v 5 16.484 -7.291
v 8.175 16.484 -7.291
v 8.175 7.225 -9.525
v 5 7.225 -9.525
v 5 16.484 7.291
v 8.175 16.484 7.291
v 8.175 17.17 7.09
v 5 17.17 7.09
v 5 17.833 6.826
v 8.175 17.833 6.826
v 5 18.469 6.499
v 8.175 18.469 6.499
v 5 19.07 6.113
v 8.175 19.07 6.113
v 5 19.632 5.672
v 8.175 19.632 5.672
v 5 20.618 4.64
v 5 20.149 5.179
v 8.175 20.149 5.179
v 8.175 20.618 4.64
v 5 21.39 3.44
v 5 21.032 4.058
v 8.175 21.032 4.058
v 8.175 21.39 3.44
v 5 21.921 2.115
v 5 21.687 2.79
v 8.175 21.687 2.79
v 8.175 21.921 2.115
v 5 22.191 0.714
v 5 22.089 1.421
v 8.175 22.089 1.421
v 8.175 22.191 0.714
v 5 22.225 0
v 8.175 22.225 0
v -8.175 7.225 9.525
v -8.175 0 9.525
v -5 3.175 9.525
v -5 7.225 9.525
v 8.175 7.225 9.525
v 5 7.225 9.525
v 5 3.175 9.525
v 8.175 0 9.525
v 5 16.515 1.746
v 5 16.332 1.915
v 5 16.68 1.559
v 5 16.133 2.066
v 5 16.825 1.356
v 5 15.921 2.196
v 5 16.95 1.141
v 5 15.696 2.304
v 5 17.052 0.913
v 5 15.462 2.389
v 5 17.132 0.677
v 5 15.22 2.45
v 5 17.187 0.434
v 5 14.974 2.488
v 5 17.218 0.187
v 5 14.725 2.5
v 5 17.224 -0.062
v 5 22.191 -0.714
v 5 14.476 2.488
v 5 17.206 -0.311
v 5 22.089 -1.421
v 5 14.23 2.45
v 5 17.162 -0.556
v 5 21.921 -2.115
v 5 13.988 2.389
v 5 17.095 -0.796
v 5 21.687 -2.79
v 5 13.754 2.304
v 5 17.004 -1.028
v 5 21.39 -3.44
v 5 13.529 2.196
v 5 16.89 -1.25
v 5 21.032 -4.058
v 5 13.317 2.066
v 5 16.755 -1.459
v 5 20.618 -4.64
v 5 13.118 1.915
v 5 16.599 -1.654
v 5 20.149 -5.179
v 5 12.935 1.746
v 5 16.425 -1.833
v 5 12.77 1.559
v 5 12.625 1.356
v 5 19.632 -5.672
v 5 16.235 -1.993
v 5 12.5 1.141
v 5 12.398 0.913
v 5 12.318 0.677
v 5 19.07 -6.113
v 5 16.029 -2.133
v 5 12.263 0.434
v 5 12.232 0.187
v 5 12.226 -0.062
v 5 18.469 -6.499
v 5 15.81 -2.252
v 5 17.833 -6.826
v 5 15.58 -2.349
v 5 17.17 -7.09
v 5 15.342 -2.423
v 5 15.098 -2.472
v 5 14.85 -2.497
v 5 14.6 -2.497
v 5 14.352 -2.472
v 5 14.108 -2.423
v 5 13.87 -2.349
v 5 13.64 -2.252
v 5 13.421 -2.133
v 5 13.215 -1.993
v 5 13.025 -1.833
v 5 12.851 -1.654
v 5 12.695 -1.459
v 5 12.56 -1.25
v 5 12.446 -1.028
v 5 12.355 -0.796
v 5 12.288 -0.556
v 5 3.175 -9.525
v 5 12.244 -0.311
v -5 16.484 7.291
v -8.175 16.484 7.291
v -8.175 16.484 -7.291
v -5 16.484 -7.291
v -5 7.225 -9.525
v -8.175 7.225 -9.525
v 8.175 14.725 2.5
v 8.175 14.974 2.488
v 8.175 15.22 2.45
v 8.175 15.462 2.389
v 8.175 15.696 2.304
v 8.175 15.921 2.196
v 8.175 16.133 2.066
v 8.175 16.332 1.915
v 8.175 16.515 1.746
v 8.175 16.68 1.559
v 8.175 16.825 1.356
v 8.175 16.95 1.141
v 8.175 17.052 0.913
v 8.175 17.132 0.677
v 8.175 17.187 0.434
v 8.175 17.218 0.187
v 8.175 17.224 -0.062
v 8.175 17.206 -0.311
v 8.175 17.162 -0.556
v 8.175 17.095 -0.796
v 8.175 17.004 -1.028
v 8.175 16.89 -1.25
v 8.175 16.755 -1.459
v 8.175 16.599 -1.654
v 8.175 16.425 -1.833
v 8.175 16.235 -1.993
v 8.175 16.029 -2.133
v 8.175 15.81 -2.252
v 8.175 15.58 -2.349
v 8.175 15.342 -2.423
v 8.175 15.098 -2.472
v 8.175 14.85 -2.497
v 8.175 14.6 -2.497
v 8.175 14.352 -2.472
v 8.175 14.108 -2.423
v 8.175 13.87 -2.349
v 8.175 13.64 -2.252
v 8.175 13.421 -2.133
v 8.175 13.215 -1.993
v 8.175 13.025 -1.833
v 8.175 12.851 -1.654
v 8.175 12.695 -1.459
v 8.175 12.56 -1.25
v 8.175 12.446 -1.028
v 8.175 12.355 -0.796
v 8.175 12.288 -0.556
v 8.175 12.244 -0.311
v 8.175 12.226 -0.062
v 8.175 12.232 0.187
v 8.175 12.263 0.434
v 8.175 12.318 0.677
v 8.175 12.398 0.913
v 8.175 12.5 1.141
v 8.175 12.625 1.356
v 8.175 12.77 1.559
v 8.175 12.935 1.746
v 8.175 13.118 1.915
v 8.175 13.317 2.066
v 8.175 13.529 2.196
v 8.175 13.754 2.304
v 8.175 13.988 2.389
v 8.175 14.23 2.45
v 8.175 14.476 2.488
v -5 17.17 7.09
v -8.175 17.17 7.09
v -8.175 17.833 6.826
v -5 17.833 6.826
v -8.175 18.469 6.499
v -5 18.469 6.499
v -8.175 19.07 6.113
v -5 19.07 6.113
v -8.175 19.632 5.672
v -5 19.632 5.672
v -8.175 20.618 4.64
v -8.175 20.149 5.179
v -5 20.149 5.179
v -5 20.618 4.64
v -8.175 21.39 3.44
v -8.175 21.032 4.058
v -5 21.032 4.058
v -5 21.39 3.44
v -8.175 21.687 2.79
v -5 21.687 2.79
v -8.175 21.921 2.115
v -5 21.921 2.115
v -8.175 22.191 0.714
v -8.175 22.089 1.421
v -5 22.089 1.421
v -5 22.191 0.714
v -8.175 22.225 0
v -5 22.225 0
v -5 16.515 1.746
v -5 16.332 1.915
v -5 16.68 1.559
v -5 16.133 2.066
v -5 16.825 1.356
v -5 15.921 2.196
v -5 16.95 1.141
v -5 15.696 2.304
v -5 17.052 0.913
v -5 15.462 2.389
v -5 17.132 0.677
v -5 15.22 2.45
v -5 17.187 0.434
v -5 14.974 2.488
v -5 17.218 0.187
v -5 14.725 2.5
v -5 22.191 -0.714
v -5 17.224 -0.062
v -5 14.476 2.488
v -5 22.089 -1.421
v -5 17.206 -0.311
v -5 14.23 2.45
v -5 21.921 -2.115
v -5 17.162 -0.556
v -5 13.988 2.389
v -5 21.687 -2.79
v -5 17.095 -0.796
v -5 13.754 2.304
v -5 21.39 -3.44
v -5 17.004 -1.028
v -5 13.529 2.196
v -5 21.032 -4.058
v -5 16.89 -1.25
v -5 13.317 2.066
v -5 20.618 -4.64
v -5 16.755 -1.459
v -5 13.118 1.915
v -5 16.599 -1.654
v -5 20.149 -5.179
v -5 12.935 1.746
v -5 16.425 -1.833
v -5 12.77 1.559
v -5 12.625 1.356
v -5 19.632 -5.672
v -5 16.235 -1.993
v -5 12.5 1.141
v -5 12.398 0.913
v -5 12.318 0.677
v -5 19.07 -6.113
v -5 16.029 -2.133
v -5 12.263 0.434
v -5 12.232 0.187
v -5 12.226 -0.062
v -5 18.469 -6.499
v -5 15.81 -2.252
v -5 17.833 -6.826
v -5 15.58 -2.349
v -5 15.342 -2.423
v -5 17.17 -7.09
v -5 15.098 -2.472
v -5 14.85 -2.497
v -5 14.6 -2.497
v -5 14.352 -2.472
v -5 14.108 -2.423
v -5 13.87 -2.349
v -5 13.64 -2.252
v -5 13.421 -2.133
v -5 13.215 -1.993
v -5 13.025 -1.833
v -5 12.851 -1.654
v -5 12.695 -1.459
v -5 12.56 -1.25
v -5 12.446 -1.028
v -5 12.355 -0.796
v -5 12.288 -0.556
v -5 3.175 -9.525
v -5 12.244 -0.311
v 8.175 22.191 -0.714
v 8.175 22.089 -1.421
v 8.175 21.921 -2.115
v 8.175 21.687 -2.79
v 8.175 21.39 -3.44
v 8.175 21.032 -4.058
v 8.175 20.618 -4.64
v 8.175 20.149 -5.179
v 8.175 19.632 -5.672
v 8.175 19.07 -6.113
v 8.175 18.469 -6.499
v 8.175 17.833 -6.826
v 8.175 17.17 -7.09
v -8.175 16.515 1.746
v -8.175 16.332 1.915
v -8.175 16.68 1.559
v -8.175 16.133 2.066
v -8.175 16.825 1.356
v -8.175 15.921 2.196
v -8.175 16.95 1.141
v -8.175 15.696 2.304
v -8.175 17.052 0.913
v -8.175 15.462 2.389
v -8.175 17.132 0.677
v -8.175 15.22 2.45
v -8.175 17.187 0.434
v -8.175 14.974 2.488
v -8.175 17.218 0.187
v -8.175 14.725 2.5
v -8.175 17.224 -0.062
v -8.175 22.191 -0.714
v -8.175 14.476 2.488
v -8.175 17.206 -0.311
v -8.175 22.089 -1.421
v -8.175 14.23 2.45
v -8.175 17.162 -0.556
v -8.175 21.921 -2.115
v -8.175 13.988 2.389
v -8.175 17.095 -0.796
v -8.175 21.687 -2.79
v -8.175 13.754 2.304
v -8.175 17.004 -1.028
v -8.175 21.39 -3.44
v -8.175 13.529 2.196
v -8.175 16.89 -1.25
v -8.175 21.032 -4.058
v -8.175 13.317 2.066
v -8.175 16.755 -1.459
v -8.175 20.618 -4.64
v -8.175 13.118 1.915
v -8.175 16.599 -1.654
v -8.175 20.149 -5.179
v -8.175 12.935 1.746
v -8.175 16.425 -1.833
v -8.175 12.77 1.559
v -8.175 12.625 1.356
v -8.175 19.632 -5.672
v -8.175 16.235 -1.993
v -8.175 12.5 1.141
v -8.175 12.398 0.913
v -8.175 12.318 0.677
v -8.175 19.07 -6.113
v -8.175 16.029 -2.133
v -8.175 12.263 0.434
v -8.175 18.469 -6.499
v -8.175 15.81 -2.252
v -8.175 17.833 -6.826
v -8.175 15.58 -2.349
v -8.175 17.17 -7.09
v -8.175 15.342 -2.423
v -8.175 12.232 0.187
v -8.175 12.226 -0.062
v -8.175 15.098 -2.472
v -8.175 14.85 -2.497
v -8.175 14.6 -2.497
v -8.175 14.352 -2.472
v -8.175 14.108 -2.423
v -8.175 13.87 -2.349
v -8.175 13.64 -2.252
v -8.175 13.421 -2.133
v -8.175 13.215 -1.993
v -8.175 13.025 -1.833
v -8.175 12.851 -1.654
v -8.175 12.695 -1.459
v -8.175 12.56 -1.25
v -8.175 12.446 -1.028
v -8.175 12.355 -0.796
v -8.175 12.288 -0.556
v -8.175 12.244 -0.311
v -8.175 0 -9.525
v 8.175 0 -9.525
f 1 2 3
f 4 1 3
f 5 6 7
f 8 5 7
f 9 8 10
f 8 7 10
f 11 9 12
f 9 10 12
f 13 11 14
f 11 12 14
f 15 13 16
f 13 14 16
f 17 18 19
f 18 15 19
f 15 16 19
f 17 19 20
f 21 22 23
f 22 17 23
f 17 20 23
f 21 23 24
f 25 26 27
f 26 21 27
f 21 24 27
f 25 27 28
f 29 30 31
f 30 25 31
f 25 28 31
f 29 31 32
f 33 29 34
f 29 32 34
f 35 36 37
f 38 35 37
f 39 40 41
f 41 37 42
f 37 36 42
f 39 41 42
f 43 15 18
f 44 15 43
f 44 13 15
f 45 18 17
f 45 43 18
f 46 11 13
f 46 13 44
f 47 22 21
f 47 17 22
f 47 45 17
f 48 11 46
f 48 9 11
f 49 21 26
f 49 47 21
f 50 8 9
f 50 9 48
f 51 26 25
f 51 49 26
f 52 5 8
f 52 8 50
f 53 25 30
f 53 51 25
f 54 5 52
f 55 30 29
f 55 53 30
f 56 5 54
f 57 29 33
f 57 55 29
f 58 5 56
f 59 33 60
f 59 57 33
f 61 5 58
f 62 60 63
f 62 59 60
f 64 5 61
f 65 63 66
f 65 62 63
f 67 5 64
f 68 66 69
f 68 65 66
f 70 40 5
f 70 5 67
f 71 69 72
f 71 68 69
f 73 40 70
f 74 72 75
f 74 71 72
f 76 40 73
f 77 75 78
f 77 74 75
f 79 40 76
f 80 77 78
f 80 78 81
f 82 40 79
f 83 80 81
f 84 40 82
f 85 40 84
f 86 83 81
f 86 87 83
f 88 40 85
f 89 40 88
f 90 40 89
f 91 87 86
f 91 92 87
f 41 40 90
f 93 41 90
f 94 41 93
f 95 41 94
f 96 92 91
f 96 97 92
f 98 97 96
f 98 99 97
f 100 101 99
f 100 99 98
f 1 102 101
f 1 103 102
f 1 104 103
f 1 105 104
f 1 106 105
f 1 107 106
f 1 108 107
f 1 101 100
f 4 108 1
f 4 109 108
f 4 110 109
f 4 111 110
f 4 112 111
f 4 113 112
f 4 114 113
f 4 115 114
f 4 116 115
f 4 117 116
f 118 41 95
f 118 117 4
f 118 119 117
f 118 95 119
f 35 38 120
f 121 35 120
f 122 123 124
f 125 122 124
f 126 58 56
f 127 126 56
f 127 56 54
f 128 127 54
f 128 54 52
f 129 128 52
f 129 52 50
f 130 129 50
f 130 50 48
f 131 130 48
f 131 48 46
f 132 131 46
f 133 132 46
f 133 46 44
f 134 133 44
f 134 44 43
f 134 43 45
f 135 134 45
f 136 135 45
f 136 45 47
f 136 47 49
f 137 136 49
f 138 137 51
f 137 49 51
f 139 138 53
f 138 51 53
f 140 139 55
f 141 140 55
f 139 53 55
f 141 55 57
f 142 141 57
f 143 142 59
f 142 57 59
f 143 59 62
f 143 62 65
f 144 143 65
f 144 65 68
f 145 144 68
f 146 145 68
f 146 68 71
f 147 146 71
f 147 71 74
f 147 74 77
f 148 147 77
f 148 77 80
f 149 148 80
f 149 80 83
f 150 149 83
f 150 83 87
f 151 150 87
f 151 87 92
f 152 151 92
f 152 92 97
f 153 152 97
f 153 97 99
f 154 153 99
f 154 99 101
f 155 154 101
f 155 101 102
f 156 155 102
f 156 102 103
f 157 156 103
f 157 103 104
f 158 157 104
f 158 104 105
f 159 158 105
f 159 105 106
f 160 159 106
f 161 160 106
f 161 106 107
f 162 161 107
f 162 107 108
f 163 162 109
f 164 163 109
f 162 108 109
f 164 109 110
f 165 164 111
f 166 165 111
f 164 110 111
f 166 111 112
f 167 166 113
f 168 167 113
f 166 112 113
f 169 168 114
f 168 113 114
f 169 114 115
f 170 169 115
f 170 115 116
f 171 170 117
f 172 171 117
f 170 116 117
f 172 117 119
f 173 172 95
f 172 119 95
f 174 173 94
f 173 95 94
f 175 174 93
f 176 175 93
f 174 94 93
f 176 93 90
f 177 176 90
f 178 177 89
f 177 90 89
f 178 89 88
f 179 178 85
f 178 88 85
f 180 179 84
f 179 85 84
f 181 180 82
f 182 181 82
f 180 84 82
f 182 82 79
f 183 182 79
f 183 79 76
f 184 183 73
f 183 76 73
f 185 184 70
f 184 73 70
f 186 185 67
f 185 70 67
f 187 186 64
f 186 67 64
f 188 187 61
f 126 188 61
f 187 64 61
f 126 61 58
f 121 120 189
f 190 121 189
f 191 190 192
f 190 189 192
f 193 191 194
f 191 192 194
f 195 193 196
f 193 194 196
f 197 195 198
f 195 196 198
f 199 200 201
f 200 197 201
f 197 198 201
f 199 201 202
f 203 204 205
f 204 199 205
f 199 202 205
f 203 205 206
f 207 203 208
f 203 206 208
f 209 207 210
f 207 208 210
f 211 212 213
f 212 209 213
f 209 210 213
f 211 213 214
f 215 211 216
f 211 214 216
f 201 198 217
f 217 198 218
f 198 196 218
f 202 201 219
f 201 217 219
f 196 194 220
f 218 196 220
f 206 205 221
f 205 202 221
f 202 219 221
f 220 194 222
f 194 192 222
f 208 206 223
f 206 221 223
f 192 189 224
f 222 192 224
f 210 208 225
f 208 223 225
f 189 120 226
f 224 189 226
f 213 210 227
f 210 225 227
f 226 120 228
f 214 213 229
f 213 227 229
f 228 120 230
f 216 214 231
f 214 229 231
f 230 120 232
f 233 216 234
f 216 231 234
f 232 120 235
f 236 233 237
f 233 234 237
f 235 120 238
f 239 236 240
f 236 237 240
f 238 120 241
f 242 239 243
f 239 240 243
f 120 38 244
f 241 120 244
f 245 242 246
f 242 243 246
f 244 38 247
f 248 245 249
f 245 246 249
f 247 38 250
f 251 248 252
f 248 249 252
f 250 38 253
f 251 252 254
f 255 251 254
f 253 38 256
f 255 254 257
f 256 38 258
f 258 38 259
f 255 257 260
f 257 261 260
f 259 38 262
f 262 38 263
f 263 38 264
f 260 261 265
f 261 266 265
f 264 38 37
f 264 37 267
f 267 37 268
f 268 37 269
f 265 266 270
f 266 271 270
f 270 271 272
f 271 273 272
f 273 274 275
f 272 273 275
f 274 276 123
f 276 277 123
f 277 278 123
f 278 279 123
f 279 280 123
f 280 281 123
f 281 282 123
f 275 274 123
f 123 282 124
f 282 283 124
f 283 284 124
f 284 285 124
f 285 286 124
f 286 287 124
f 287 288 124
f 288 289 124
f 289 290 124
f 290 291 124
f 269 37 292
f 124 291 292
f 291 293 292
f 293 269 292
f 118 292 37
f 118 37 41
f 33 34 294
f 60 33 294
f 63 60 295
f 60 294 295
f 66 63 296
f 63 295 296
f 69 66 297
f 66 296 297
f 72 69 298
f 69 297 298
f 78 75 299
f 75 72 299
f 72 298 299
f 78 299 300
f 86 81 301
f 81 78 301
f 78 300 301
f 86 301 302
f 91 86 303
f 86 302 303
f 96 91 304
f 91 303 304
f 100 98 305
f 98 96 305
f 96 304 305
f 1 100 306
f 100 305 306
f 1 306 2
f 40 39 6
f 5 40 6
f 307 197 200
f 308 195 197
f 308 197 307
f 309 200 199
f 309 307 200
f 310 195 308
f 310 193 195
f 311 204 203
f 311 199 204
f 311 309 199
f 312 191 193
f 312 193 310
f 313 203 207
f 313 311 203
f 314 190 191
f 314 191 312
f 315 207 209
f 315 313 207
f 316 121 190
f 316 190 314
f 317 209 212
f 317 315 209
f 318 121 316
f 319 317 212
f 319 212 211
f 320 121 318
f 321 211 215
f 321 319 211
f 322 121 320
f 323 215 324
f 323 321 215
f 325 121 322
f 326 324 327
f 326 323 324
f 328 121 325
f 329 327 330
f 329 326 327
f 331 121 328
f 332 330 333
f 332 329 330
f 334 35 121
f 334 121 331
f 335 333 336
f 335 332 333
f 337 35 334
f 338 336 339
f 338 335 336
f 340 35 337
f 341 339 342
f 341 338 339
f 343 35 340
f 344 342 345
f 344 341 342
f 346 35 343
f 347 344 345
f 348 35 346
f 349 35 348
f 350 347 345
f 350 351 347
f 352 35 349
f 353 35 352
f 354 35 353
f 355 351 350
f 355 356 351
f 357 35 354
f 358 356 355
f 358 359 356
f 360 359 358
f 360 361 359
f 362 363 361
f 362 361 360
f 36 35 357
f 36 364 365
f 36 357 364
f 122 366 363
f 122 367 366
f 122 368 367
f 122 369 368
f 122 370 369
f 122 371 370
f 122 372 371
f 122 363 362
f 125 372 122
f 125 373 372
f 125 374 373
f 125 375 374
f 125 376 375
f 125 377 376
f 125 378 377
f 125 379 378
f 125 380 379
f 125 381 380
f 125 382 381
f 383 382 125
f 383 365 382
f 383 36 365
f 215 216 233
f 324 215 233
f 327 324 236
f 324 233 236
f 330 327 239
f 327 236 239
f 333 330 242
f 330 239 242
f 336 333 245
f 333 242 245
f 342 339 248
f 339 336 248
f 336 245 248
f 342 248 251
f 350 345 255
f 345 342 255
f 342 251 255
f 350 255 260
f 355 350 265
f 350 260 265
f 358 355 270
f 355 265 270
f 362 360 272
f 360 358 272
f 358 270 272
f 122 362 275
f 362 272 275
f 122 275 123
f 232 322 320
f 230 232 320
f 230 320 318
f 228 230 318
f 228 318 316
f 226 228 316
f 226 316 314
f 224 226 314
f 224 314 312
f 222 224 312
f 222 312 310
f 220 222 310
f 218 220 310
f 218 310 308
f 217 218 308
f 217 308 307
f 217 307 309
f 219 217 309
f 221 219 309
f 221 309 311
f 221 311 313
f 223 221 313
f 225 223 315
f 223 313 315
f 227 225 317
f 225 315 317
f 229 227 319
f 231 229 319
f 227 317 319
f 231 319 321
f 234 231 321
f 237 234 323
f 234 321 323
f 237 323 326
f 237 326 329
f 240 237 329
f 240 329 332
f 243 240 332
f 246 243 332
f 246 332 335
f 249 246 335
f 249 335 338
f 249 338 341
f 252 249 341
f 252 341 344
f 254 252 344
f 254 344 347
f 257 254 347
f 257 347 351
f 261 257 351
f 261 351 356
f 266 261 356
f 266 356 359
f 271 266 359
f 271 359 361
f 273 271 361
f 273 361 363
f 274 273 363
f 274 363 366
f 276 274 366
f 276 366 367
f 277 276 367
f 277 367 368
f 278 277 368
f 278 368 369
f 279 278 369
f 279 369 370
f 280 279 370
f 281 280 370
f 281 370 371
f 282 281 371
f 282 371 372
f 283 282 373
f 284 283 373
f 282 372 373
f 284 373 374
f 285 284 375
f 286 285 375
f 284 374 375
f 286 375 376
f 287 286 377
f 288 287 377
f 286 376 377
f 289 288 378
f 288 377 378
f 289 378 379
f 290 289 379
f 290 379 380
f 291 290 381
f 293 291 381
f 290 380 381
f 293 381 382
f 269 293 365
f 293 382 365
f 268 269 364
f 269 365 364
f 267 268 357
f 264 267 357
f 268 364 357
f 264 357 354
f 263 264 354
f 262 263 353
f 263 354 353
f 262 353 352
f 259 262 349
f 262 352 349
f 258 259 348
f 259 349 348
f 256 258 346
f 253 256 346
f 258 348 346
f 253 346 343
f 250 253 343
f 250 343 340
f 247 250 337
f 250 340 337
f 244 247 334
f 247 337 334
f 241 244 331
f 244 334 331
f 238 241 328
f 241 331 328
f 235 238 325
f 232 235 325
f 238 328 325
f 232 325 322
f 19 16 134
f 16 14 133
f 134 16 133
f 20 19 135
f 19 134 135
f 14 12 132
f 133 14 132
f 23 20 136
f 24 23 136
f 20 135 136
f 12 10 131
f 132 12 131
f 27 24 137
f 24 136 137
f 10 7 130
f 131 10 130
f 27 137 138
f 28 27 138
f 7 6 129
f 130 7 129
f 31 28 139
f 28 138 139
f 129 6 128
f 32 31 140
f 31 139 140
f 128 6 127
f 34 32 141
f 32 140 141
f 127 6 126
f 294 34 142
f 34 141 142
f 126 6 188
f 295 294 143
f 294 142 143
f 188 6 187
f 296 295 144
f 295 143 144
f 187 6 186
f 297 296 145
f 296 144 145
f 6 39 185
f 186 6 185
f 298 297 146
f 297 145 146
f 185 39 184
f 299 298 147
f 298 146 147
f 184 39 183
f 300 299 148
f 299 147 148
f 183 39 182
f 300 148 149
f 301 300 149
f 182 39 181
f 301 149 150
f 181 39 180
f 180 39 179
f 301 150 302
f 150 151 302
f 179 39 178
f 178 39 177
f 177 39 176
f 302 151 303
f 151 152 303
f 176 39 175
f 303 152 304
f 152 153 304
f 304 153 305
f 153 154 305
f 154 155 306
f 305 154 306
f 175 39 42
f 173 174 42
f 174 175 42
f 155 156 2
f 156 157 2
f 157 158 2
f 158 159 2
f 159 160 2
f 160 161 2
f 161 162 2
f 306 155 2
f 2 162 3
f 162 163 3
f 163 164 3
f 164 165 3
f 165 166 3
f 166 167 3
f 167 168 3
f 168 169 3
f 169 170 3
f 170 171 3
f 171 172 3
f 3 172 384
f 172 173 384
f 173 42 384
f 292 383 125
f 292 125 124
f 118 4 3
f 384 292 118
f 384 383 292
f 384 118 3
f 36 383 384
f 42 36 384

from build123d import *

# Parameters (mm, degrees)
SKETCH1_W             = 3.175
SKETCH1_H             = 19.05
SKETCH1_W_2           = 10
BOSS_EXTRUDE1_DEPTH   = 3.175
BOSS_EXTRUDE2_START   = 3.175
SKETCH1_3_W           = 3.175
SKETCH1_3_H           = 19.05
BOSS_EXTRUDE2_DEPTH   = 19.05
CUT_EXTRUDE1_DEPTH    = 30.189017626
F_5_0MM_DOWEL_HOLE1_D = 5


with BuildPart() as part:
    # Sketch1 → Boss-Extrude1 (new body)
    with BuildSketch(Plane(origin=(0, 0, 0), x_dir=(1, 0, 0), z_dir=(0, 1, 0))):
        with Locations((-6.5875, 0)):
            Rectangle(SKETCH1_W, SKETCH1_H)
        Rectangle(SKETCH1_W_2, SKETCH1_H)
        with Locations((6.5875, 0)):
            Rectangle(SKETCH1_W, SKETCH1_H)
    extrude(amount=BOSS_EXTRUDE1_DEPTH)

    # Sketch1<3> → Boss-Extrude2 (add)
    with BuildSketch(Plane(origin=(0, 0, 0), x_dir=(1, 0, 0), z_dir=(0, 1, 0)).offset(BOSS_EXTRUDE2_START)):
        with Locations((-6.5875, 0)):
            Rectangle(SKETCH1_3_W, SKETCH1_3_H)
        with Locations((6.5875, 0)):
            Rectangle(SKETCH1_3_W, SKETCH1_3_H)
    extrude(amount=BOSS_EXTRUDE2_DEPTH)

    # Sketch2 → Cut-Extrude1 (cut, through all)
    with BuildSketch(Plane(origin=(8.175, 0, 0), x_dir=(0, 0, -1), z_dir=(1, 0, 0))):
        with BuildLine():
            Line((-9.525, 22.225), (-9.525, 7.225))
            Line((-9.525, 7.225), (-7.290749742, 16.484252172))
            ThreePointArc((-7.290749742, 16.484252172), (-4.6398065, 20.617554255), (0, 22.225))
            Line((0, 22.225), (-9.525, 22.225))
        make_face()
        with BuildLine():
            Line((9.525, 22.225), (0, 22.225))
            ThreePointArc((0, 22.225), (4.6398065, 20.617554255), (7.290749742, 16.484252172))
            Line((7.290749742, 16.484252172), (9.525, 7.225))
            Line((9.525, 7.225), (9.525, 22.225))
        make_face()
    extrude(amount=-CUT_EXTRUDE1_DEPTH, mode=Mode.SUBTRACT)

    # Ø5.0mm Dowel Hole1 (through all)
    with Locations(Plane(origin=(8.175, 0, 0), x_dir=(0, 0, -1), z_dir=(1, 0, 0))):
        with Locations((0, 14.725)):
            Hole(F_5_0MM_DOWEL_HOLE1_D / 2)


solid = part.part
